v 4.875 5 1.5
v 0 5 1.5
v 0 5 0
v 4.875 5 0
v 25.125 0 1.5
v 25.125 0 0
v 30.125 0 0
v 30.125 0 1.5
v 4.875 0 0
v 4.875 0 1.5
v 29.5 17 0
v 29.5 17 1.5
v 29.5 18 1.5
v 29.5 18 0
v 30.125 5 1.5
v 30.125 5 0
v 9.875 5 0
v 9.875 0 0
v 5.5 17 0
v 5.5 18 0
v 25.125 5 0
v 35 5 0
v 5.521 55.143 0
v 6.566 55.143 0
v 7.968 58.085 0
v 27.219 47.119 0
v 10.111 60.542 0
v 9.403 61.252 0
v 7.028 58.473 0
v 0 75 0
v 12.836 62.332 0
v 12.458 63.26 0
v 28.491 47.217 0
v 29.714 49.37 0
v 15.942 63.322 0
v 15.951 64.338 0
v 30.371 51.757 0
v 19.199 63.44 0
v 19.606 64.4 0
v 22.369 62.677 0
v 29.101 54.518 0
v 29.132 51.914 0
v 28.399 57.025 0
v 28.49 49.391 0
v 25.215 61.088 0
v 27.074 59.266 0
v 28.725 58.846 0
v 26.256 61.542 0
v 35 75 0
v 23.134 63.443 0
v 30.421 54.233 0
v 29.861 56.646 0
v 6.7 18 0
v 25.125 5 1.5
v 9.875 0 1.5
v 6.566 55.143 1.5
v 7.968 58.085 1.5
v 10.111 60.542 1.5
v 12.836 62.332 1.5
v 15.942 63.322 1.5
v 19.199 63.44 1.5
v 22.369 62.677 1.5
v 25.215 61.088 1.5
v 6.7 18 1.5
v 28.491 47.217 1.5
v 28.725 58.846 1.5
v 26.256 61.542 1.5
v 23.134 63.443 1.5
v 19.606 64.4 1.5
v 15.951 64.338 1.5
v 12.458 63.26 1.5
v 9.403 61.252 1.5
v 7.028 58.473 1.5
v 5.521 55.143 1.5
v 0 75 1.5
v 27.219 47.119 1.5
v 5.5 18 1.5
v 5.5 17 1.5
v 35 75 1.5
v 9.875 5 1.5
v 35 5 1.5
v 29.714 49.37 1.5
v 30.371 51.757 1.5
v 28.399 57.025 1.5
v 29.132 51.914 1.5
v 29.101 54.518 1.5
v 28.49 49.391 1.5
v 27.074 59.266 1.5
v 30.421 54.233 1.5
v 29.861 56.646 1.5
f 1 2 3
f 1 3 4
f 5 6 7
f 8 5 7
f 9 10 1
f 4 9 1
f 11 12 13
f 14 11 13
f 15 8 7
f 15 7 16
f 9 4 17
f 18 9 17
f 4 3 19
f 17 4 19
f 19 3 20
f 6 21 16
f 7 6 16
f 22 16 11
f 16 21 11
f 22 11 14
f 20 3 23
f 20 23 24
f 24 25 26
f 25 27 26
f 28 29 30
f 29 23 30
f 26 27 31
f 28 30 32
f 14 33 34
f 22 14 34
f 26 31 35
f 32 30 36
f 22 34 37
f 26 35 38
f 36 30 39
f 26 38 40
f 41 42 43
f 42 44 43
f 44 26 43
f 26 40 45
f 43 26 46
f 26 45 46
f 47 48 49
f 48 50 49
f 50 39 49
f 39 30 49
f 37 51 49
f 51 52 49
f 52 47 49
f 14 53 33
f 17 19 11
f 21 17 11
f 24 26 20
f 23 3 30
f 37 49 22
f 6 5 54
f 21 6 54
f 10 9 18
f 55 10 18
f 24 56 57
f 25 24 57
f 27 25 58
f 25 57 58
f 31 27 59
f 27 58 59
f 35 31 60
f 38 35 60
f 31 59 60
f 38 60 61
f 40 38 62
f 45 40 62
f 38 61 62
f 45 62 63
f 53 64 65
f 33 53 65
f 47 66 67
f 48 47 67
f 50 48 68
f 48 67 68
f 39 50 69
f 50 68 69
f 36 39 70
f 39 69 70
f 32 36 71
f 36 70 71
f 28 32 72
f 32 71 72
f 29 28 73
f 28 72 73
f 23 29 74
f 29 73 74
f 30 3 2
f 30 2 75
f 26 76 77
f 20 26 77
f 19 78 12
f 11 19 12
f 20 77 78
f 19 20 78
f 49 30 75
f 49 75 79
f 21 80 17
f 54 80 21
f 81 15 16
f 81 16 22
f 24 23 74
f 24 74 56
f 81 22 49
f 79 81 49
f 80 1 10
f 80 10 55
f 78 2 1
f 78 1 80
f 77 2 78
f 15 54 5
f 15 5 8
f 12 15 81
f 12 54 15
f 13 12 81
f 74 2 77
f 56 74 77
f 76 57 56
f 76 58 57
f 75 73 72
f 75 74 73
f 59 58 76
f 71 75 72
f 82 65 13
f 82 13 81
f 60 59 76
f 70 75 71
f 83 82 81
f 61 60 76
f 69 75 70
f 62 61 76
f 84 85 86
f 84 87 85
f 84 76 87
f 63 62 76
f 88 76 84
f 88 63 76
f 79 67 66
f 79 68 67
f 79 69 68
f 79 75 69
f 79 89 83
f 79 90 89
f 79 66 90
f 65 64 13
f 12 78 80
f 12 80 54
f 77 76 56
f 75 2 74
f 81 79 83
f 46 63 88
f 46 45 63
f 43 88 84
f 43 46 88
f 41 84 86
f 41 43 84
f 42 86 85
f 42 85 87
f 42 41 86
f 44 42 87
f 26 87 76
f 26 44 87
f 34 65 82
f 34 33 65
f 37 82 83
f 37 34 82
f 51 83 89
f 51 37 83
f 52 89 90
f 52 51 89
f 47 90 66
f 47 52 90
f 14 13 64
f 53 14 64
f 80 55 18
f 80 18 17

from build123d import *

# Parameters (mm, degrees)
SKIZZE1_W                        = 35
SKIZZE1_H                        = 75
AUFSATZ_LINEAR_AUSTRAGEN1_DEPTH  = 1.5
SKIZZE3_W                        = 15.25
SKIZZE3_H                        = 5
SKIZZE3_W_2                      = 4.875
SCHNITT_LINEAR_AUSTRAGEN12_DEPTH = 20
SCHNITT_LINEAR_AUSTRAGEN14_DEPTH = 1.5
VERRUNDUNG1_R                    = 10
VERRUNDUNG2_R                    = 10


with BuildPart() as part:
    # Skizze1 → Aufsatz-Linear austragen1 (new body)
    with BuildSketch(Plane.XY):
        with Locations((17.5, 37.5)):
            Rectangle(SKIZZE1_W, SKIZZE1_H)
    extrude(amount=AUFSATZ_LINEAR_AUSTRAGEN1_DEPTH)

    # Skizze3 → Schnitt-Linear austragen12 (cut)
    with BuildSketch(Plane.XY.offset(1.5)):
        with Locations((17.5, 2.5)):
            Rectangle(SKIZZE3_W, SKIZZE3_H)
        with Locations((32.5625, 2.5)):
            Rectangle(SKIZZE3_W_2, SKIZZE3_H)
        with Locations((2.4375, 2.5)):
            Rectangle(SKIZZE3_W_2, SKIZZE3_H)
    extrude(amount=-SCHNITT_LINEAR_AUSTRAGEN12_DEPTH, mode=Mode.SUBTRACT)

    # Skizze7 → Schnitt-Linear austragen14 (cut)
    with BuildSketch(Plane.XY.offset(1.5)):
        with BuildLine():
            Line((29.980893063, 50.823094237), (5.5, 18))
            Line((5.5, 18), (5.5, 17))
            Line((5.5, 17), (29.5, 17))
            Line((29.5, 17), (29.5, 18))
            Line((29.5, 18), (6.7, 18))
            Line((6.7, 18), (30.963924784, 50.532191031))
            ThreePointArc((30.963924784, 50.532191031), (20.317920223, 64.291686591), (5.520765623, 55.142623967))
            Line((5.520765623, 55.142623967), (6.566221507, 55.142623967))
            ThreePointArc((6.566221507, 55.142623967), (20.177020409, 63.300872092), (29.980893063, 50.823094237))
        make_face()
    extrude(amount=-SCHNITT_LINEAR_AUSTRAGEN14_DEPTH, mode=Mode.SUBTRACT)

    # Verrundung1
    verrundung1_edges = [part.edges().sort_by_distance(p)[0] for p in [
        (30.963924784, 50.532191031, 0.75),
    ]]
    fillet(verrundung1_edges, radius=VERRUNDUNG1_R)

    # Verrundung2
    verrundung2_edges = [part.edges().sort_by_distance(p)[0] for p in [
        (29.980893063, 50.823094237, 0.75),
    ]]
    fillet(verrundung2_edges, radius=VERRUNDUNG2_R)


solid = part.part
